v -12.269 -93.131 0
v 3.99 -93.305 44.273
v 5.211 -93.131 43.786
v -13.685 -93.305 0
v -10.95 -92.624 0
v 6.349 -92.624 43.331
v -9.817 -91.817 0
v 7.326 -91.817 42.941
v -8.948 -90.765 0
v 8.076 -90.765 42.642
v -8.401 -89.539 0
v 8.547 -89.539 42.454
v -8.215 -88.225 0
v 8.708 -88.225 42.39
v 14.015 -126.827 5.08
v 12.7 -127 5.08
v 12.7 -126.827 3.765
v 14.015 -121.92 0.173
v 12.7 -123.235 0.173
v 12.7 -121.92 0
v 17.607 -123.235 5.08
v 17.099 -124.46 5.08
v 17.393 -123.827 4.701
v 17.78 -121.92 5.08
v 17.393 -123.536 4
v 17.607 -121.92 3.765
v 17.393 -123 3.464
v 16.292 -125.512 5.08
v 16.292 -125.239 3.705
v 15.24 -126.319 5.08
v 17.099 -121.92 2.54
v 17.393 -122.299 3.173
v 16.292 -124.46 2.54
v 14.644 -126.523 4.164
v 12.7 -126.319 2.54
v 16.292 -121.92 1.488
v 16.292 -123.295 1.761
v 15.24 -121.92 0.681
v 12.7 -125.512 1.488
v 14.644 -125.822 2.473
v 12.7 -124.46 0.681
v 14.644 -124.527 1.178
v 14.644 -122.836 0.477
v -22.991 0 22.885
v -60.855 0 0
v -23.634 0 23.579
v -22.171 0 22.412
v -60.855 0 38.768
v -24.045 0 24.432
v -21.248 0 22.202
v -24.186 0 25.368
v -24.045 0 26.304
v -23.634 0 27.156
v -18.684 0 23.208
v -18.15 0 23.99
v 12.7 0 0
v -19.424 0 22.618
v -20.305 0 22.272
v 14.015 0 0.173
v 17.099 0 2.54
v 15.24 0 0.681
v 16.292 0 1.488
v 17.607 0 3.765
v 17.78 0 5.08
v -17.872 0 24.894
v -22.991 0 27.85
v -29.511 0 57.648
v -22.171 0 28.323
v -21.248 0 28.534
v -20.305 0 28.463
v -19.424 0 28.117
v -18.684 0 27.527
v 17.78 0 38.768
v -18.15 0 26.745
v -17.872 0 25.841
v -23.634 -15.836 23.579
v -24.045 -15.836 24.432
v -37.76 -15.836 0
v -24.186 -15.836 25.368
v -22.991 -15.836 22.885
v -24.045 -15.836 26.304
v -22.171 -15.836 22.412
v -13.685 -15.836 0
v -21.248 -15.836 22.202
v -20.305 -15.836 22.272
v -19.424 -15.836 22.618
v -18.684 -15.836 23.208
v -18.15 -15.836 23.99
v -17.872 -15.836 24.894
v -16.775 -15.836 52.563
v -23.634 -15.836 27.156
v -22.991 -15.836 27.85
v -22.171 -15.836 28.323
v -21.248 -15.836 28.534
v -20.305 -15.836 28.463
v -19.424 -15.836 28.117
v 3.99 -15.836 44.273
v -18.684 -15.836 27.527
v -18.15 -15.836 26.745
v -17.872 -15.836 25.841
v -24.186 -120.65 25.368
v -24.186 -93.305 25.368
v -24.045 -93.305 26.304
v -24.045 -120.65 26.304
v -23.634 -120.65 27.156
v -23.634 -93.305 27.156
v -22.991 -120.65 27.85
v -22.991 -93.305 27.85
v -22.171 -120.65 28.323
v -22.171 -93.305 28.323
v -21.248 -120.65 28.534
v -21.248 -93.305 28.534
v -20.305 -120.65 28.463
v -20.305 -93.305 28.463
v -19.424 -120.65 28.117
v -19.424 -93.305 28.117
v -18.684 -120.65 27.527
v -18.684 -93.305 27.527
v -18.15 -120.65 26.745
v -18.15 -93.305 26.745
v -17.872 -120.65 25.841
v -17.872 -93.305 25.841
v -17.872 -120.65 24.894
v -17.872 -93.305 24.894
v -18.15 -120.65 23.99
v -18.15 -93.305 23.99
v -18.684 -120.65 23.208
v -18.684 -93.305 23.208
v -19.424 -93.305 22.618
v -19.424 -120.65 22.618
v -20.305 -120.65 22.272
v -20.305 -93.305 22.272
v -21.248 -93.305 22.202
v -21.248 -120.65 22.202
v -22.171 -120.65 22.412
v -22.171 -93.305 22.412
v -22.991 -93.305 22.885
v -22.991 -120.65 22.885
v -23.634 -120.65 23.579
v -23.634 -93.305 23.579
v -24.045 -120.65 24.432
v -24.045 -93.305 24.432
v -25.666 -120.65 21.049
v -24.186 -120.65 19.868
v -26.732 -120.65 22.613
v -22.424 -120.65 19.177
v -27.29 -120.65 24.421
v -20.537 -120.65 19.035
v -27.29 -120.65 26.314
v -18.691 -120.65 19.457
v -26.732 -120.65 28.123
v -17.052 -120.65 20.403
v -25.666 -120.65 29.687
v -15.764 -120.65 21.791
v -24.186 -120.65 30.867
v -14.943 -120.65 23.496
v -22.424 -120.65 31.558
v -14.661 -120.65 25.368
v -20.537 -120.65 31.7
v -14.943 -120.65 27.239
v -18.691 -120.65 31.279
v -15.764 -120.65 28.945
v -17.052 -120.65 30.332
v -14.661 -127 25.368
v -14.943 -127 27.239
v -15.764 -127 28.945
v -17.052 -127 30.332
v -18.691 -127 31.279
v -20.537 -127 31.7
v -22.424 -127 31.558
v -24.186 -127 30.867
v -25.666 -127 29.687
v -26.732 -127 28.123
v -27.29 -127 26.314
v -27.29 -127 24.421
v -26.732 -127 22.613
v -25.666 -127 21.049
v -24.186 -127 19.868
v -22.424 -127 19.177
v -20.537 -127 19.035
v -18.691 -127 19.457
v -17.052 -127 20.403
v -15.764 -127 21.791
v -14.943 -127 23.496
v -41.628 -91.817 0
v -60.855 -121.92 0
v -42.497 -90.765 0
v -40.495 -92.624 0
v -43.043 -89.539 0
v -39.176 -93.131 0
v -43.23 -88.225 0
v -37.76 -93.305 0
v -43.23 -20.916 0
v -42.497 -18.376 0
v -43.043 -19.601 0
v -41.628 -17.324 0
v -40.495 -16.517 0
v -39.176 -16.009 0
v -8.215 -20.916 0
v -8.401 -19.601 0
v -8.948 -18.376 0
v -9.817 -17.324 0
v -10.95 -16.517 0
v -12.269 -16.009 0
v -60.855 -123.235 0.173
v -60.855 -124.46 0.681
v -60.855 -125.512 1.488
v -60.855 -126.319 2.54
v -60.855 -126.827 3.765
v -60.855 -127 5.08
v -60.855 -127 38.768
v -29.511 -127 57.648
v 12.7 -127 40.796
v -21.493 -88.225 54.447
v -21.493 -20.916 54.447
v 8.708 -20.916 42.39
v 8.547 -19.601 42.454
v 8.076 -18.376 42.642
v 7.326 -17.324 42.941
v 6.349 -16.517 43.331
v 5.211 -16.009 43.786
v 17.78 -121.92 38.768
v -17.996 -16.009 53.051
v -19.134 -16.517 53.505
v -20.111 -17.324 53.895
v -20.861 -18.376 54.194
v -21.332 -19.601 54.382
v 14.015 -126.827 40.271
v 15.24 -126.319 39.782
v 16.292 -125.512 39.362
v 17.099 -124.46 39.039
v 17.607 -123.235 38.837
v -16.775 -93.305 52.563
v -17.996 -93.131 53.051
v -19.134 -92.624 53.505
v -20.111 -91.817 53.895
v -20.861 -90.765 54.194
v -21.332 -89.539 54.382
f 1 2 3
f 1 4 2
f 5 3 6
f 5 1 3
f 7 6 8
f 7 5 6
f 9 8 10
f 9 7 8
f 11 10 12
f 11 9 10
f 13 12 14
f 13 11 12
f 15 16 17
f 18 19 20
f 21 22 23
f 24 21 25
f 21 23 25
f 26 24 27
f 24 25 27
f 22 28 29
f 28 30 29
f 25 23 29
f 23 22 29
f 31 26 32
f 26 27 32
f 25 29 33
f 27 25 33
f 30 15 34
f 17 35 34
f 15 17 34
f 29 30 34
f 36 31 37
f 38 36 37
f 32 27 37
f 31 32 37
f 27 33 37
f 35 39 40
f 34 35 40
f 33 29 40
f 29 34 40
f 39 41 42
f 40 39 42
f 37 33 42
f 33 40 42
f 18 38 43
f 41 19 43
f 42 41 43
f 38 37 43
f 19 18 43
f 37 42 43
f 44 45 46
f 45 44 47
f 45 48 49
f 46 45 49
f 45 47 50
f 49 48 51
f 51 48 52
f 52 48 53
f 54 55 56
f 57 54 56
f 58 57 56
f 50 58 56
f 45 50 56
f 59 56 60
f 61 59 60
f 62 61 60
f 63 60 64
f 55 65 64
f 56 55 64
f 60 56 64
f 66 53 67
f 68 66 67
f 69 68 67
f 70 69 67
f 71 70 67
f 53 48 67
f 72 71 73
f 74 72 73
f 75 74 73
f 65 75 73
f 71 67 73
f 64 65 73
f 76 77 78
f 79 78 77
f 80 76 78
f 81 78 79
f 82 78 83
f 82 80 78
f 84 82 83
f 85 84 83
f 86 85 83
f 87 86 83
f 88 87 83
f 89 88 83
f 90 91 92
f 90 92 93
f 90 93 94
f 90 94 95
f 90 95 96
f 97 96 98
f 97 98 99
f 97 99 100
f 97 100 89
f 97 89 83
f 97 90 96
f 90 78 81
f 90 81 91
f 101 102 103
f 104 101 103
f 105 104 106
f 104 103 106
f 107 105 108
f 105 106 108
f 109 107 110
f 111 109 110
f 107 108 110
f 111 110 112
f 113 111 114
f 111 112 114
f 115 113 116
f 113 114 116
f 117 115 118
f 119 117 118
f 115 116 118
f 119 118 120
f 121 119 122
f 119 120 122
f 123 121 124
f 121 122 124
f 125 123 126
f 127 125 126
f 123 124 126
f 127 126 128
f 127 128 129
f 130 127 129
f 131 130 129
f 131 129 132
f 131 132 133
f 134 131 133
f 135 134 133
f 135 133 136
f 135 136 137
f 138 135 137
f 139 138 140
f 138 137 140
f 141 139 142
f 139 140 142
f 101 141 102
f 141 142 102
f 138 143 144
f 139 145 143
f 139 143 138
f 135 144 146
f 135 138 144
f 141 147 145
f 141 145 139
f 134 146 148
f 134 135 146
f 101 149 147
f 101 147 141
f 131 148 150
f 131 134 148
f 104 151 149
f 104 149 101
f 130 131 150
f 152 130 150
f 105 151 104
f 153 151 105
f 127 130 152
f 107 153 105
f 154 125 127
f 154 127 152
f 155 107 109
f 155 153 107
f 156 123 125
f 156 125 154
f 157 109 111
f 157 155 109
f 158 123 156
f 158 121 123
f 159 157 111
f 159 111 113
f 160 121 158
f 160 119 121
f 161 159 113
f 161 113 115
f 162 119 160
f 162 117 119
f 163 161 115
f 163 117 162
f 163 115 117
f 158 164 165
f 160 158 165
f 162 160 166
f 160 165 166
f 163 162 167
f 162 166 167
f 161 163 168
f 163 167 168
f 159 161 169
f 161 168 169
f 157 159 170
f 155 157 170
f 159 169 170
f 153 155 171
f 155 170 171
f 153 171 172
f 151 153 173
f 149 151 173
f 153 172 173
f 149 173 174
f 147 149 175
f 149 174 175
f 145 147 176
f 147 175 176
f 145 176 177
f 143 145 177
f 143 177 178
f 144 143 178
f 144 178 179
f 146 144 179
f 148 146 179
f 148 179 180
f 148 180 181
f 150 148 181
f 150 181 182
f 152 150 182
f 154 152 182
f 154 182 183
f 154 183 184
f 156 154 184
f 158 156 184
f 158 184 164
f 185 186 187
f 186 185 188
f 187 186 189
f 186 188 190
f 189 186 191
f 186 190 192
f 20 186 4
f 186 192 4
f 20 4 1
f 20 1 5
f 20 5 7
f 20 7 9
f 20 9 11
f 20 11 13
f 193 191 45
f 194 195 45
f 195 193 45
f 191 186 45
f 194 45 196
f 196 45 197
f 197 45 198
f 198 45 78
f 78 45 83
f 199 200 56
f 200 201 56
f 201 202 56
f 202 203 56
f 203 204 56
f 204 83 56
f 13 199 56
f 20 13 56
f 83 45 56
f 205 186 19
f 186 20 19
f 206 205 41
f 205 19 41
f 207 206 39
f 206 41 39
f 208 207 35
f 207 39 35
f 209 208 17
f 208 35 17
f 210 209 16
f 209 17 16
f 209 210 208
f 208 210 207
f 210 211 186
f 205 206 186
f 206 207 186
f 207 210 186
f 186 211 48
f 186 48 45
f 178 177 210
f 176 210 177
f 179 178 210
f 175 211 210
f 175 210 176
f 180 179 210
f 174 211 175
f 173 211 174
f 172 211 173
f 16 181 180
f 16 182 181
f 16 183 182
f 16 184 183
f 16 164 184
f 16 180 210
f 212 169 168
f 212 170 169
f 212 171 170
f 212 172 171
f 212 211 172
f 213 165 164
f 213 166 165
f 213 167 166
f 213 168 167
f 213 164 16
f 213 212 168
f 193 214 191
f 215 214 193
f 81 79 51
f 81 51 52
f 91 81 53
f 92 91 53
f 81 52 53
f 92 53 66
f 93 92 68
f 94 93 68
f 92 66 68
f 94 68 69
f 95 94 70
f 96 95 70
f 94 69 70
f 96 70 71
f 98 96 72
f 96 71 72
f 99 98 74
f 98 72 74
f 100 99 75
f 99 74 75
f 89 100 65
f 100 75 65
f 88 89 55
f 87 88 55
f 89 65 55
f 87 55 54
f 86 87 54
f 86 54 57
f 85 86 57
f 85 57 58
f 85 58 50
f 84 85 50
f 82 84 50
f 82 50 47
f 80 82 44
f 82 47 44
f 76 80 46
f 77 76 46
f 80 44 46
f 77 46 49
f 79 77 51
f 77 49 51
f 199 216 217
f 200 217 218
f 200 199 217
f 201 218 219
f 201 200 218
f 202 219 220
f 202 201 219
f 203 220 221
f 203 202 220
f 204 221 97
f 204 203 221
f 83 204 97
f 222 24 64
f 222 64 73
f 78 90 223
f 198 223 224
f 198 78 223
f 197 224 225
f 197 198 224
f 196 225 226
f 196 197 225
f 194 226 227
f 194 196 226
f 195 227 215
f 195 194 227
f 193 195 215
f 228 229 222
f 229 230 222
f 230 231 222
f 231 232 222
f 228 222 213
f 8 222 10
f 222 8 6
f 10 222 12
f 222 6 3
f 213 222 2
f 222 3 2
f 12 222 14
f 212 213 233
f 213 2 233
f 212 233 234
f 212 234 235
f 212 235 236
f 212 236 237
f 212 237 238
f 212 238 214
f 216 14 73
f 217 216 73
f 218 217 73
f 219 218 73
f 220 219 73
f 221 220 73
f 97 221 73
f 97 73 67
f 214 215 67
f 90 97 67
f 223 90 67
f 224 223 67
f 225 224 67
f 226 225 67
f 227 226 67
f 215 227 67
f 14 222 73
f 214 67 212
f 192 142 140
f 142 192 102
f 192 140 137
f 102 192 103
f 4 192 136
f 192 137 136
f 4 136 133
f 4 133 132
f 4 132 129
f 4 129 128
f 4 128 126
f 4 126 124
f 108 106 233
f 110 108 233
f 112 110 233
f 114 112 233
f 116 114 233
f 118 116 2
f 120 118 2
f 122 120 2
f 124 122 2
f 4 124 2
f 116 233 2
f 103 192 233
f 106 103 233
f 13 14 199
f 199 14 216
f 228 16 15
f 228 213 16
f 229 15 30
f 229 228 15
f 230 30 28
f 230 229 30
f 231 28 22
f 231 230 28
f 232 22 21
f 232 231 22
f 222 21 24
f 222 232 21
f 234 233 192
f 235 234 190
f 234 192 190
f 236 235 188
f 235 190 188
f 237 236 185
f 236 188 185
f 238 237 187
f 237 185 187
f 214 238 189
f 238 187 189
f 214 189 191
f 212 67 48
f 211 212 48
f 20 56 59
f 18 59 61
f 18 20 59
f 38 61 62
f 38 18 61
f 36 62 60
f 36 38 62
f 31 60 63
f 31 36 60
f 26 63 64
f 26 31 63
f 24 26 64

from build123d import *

# Parameters (mm, degrees)
F1_DEPTH       = 127
F3_D           = 6.35
F3_CBORE_D     = 12.7
F3_CBORE_DEPTH = 6.35
F4_R           = 5.08
F5_W           = 32.5189703144
F5_H           = 77.4685703218
F6_DEPTH       = 65.1611467814
F7_R           = 5.08


with BuildPart() as f1:
    # F0 (on Front) → F1 (new body)
    with BuildSketch(Plane.XZ):
        Polygon((-60.8552582562, 38.7677326798), (-60.8552582562, 0), (17.7800003439, 0), (17.7800003439, 38.7677326798), (-29.5111350715, 57.6475299895), align=None)
    extrude(amount=F1_DEPTH)

    # F3 (through all)
    with Locations(Plane.XZ.offset(127)):
        with Locations((-21.01104334, 25.3676697612)):
            CounterBoreHole(F3_D / 2, F3_CBORE_D / 2, F3_CBORE_DEPTH)

    # F4
    f4_edges = [f1.edges().sort_by_distance(p)[0] for p in [
        (-21.537629, -127, 0),
        (17.78, -127, 19.383866),
        (17.78, -63.5, 0),
    ]]
    fillet(f4_edges, radius=F4_R)

    # F5 (on face) → F6 (cut, through all)
    with BuildSketch(Plane(origin=(15.7936314356, 0, 39.5607405457), x_dir=(0.9287247193, 0, -0.3707700038), z_dir=(0.3707700038, 0, 0.9287247193))):
        with Locations((-23.8889742177, -54.570266977)):
            Rectangle(F5_W, F5_H)
    extrude(amount=-F6_DEPTH, mode=Mode.SUBTRACT)

    # F7
    f7_edges = [f1.edges().sort_by_distance(p)[0] for p in [
        (-32.361451, -15.835982, 27.223292),
        (0.24646, -15.835982, 21.194763),
        (0.24646, -93.304552, 21.194763),
        (-32.361451, -93.304552, 27.223292),
    ]]
    fillet(f7_edges, radius=F7_R)


solid = f1.part
